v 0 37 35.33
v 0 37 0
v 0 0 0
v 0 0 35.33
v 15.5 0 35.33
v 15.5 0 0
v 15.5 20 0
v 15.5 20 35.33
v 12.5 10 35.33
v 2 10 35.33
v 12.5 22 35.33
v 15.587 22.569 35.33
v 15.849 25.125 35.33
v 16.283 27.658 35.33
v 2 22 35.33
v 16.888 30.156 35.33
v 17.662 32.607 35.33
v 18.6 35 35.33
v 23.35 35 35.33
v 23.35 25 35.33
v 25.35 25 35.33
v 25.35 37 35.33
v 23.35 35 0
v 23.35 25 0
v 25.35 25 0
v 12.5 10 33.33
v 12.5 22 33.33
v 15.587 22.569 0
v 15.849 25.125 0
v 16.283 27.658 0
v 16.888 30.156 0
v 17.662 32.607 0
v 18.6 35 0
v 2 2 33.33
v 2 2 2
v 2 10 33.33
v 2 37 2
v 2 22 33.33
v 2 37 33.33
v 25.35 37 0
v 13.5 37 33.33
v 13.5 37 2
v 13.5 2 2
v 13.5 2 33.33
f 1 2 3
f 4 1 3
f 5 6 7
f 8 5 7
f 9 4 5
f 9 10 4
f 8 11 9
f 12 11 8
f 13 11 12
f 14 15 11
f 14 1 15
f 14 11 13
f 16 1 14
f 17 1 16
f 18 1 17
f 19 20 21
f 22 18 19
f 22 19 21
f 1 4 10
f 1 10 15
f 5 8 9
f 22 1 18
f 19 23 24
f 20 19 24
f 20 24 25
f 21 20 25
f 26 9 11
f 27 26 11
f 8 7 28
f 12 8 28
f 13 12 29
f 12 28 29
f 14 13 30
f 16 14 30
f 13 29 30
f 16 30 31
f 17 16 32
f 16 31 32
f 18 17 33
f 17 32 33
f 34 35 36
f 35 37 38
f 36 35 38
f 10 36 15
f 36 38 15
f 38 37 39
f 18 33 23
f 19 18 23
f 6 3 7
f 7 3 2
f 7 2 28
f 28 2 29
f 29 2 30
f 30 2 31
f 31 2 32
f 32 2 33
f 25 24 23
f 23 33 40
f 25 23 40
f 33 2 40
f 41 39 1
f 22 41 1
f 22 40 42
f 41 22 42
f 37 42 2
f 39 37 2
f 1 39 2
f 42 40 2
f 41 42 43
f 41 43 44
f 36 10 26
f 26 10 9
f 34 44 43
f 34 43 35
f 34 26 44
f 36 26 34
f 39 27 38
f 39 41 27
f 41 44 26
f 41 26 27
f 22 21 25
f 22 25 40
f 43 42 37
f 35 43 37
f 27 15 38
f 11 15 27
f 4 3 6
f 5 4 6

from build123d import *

# Parameters (mm, degrees)
F1_DEPTH = 35.33
F2_W     = 11.5
F2_H     = 31.33
F3_DEPTH = 35
F4_W     = 10.5
F4_H     = 12
F5_DEPTH = 2


with BuildPart() as f1:
    # F0 (on Top) → F1 (new body)
    with BuildSketch(Plane.XY):
        with BuildLine():
            Line((0, 37), (0, 0))
            Line((0, 0), (15.5, 0))
            Line((15.5, 0), (15.5, 20))
            ThreePointArc((15.5, 20), (16.283103, 27.658492), (18.6, 35))
            Line((18.6, 35), (23.35, 35))
            Line((23.35, 35), (23.35, 25))
            Line((23.35, 25), (25.35, 25))
            Line((25.35, 25), (25.35, 37))
            Line((25.35, 37), (0, 37))
        make_face()
    extrude(amount=F1_DEPTH)

    # F2 (on face) → F3 (cut)
    with BuildSketch(Plane(origin=(0, 37, 0), x_dir=(-1, 0, 0), z_dir=(0, 1, 0))):
        with Locations((-7.75, 17.665)):
            Rectangle(F2_W, F2_H)
    extrude(amount=-F3_DEPTH, mode=Mode.SUBTRACT)

    # F4 (on face) → F5 (cut)
    with BuildSketch(Plane.XY.offset(35.33)):
        with Locations((7.25, 16)):
            Rectangle(F4_W, F4_H)
    extrude(amount=-F5_DEPTH, mode=Mode.SUBTRACT)


solid = f1.part
